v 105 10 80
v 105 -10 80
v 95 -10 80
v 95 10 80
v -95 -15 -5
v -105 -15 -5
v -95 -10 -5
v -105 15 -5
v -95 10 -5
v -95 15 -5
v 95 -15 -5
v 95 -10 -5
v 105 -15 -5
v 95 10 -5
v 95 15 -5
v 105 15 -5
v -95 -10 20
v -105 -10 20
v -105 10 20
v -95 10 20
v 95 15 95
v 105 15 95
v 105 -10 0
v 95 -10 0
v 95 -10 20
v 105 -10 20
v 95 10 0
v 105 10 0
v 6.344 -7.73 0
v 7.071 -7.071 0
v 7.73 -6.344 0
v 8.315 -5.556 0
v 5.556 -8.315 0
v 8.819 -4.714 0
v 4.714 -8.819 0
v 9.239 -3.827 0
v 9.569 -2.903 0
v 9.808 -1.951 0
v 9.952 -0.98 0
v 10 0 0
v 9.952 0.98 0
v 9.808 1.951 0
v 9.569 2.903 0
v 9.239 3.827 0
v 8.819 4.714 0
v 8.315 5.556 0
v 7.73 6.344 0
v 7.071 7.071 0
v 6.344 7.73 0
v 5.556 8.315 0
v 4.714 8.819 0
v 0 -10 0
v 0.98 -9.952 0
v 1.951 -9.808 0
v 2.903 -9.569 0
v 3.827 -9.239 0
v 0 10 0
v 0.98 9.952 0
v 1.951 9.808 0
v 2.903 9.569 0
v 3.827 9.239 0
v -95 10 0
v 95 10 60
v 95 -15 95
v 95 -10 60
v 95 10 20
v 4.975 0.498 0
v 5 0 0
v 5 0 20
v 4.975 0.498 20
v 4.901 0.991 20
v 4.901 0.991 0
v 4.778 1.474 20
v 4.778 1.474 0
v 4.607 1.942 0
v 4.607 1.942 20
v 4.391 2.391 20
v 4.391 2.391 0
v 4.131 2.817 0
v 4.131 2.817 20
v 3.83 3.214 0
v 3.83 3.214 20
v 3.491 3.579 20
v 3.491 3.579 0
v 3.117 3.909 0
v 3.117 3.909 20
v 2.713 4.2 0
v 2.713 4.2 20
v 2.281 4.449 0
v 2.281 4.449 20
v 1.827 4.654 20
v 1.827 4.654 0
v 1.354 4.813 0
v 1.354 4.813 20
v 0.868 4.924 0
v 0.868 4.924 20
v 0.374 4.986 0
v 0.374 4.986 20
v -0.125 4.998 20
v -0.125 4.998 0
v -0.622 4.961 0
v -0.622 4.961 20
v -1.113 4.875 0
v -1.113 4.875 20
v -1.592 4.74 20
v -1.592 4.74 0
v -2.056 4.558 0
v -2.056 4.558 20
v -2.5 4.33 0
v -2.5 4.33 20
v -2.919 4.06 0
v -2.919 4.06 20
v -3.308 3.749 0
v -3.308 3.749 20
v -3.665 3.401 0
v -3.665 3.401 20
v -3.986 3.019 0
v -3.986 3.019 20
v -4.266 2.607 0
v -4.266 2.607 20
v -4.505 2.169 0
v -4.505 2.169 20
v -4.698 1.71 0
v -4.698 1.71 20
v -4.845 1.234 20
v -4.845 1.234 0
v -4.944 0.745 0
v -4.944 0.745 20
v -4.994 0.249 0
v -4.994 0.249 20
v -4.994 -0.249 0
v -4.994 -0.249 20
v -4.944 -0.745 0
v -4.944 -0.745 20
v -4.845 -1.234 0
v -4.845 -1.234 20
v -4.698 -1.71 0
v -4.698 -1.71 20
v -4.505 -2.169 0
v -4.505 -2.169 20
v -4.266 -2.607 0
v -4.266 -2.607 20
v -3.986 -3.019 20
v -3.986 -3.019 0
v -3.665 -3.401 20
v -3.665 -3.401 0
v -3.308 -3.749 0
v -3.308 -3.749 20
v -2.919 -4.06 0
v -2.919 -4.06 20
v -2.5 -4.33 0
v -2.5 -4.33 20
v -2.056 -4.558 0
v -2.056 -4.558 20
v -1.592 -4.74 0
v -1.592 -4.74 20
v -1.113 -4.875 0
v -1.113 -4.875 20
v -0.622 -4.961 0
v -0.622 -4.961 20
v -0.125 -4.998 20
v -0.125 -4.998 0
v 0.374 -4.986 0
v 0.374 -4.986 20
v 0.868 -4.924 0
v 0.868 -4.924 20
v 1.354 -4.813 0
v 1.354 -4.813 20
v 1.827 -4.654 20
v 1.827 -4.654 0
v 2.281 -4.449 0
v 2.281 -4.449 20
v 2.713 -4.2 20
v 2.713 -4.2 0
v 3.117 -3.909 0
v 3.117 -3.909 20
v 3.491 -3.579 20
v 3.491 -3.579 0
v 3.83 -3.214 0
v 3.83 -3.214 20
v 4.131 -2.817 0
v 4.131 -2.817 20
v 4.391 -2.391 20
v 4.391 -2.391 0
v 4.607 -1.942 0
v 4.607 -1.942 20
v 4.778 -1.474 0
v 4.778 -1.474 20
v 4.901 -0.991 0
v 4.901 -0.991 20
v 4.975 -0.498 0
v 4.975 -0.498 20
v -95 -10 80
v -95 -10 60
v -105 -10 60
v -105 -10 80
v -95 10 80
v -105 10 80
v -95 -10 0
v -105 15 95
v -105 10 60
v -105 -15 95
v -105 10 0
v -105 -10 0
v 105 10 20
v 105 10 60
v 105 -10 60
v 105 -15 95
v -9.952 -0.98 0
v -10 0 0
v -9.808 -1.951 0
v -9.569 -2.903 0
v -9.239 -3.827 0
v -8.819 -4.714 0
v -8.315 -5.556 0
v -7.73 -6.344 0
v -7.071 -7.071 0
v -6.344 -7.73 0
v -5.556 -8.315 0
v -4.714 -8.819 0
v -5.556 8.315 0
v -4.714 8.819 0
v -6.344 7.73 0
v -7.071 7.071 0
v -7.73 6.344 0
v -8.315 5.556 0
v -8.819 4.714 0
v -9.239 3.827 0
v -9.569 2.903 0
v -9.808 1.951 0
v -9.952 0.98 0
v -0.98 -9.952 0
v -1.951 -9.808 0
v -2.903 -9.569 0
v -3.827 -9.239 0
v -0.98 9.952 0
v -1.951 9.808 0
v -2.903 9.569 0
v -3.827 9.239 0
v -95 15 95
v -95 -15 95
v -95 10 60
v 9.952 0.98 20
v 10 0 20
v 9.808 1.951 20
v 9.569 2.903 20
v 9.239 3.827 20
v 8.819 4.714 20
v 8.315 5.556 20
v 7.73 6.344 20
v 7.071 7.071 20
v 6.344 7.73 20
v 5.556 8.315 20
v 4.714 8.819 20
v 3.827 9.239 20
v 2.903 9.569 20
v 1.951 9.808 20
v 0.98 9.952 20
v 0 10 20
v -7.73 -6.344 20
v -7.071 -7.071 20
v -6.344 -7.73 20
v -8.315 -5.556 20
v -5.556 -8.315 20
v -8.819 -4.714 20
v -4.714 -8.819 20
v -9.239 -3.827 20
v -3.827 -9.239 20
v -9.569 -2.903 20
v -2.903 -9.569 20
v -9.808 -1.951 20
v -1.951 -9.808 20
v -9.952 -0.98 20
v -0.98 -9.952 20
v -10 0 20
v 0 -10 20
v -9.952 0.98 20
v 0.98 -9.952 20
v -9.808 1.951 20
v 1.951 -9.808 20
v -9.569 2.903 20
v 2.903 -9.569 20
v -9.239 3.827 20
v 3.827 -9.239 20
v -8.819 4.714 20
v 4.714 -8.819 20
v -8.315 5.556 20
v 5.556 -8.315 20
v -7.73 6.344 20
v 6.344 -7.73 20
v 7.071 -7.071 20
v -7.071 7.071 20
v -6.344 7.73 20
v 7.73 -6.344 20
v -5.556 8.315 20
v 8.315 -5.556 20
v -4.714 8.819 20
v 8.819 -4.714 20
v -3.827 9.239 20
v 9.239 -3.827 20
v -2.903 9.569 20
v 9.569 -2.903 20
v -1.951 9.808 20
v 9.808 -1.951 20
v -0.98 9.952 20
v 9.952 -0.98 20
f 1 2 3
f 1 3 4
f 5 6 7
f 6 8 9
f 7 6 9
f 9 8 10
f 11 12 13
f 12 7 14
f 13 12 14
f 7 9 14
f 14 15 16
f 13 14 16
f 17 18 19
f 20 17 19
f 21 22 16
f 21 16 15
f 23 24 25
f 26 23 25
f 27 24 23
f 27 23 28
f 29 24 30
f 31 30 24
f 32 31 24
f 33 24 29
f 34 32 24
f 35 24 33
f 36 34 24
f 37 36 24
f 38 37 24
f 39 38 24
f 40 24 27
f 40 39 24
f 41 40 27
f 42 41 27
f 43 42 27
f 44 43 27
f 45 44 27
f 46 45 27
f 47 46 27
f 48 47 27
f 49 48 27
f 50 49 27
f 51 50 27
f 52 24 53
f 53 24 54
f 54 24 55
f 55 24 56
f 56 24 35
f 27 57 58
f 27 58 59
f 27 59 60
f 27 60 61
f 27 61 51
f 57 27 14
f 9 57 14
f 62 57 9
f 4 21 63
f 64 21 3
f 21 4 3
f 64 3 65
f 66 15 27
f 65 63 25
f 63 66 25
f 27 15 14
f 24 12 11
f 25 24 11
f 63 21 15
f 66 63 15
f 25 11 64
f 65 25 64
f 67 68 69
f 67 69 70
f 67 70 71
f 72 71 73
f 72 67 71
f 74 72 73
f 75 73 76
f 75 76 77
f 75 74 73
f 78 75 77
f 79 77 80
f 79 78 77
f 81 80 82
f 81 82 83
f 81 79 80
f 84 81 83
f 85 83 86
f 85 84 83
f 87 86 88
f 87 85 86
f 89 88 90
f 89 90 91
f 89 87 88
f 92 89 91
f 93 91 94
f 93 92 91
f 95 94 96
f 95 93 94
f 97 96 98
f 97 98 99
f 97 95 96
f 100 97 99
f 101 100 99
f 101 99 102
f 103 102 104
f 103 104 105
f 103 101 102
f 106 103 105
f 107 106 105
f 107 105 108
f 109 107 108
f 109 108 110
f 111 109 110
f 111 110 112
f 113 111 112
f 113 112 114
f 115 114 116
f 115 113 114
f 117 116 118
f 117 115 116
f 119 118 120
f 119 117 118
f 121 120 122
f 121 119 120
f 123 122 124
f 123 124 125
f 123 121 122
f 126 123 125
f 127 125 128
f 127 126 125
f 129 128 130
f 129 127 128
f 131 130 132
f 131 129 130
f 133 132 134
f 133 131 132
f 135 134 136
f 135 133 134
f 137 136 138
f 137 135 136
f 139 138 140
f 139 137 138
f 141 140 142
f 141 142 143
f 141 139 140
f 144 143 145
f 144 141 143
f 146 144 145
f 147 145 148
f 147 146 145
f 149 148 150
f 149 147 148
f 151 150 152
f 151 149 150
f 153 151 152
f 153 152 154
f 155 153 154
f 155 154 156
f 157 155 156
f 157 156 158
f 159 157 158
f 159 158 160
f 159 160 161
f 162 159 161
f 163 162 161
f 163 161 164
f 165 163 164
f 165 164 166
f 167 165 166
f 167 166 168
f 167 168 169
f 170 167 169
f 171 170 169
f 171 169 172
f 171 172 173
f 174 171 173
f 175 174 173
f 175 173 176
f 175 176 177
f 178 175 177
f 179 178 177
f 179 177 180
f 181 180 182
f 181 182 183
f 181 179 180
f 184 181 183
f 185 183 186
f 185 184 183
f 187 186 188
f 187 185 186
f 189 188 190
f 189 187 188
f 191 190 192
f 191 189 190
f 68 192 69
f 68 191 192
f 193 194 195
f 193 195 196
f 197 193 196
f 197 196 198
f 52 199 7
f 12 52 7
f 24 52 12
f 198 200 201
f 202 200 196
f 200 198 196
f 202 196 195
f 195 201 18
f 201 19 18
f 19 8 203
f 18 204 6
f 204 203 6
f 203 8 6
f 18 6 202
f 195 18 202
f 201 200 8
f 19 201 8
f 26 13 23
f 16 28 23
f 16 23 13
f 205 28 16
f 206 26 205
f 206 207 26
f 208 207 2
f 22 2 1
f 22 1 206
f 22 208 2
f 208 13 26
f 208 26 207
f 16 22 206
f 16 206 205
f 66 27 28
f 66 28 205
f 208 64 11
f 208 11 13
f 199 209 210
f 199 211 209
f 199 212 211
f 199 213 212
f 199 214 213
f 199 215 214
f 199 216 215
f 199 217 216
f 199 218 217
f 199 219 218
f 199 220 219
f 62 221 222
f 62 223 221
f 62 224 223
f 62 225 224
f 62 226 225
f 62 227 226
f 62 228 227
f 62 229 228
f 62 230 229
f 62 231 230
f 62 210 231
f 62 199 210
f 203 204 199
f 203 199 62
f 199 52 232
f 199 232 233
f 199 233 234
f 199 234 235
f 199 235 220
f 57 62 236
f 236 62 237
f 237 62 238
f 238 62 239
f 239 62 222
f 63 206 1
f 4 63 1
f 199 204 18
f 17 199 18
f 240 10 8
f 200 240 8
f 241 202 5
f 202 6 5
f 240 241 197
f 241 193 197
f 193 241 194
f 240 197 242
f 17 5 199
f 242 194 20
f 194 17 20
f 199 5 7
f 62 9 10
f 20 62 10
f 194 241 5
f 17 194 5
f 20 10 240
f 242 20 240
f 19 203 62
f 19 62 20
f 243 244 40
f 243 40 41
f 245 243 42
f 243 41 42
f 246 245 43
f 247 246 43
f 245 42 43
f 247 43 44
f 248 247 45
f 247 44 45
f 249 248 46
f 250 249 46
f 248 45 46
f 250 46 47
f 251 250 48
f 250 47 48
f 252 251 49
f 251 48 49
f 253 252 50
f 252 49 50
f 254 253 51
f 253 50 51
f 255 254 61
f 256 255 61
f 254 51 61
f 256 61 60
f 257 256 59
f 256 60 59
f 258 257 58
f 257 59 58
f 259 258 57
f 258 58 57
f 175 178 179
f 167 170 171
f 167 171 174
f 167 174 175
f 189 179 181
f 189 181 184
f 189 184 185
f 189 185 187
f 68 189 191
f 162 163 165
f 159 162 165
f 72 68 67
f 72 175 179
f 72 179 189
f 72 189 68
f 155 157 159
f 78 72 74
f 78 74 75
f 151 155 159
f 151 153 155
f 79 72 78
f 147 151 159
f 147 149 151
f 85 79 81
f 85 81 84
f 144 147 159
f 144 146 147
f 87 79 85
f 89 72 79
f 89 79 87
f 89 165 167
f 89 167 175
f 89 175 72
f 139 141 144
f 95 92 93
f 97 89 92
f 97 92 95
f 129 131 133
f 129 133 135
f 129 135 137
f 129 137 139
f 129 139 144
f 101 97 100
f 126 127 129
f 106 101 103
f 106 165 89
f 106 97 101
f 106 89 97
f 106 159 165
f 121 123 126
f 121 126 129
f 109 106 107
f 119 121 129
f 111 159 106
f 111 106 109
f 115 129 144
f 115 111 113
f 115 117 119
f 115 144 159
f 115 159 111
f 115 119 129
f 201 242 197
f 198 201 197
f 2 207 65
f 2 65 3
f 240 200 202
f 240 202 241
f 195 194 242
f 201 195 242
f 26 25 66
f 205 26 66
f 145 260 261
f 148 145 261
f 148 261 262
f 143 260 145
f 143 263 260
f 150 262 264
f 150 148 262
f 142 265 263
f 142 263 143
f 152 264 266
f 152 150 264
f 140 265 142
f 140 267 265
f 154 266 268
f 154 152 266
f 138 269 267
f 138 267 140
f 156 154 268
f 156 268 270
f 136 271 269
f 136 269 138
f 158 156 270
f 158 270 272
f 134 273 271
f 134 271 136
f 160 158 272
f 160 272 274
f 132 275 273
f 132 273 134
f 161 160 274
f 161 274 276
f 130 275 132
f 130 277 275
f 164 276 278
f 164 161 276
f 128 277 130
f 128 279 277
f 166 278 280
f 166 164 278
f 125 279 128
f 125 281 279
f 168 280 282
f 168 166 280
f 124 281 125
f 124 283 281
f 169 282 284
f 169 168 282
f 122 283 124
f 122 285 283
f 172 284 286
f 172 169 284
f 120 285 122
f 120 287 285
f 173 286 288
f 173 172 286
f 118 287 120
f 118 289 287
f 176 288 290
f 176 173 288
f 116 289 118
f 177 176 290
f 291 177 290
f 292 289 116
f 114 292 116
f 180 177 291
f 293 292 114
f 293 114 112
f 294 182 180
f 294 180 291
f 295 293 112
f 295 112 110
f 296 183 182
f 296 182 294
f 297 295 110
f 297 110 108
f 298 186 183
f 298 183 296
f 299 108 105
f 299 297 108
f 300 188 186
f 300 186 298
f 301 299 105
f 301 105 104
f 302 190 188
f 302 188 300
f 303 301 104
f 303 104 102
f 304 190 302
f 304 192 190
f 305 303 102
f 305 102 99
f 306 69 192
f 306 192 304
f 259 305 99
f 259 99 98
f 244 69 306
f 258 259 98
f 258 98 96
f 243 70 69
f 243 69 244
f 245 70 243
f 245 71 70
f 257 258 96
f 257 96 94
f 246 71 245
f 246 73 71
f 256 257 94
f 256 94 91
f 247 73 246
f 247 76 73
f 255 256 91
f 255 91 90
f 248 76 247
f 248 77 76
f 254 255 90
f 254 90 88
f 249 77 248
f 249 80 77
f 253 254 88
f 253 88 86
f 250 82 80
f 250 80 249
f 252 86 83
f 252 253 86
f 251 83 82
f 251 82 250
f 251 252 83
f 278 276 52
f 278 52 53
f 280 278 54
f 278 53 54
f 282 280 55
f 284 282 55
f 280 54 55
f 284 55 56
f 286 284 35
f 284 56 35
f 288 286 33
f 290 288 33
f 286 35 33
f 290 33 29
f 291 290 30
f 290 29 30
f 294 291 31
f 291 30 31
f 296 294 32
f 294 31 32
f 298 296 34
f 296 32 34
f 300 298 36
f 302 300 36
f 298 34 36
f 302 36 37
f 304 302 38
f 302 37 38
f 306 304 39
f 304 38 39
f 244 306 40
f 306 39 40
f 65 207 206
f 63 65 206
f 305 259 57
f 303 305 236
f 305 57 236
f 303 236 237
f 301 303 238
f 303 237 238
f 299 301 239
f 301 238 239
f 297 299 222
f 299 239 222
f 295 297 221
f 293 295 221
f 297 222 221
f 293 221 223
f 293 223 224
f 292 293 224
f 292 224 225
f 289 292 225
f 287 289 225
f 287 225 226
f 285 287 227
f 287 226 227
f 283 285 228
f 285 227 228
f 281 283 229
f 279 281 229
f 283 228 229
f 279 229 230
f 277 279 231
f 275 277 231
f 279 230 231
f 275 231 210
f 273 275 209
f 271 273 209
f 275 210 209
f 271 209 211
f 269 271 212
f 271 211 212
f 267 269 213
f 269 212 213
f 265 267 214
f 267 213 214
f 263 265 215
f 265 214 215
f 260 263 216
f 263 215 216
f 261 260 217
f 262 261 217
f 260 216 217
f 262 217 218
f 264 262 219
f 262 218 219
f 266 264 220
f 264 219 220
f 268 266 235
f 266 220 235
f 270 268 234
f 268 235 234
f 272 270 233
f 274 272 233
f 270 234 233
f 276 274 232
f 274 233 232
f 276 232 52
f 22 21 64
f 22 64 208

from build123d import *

# Parameters (mm, degrees)
F0_R     = 5
F2_DEPTH = 5
F3_DEPTH = 95
F1_W     = 20
F1_H     = 20
F4_DEPTH = 200
F5_DEPTH = 20


with BuildPart() as f2:
    # F0 (on Top) → F2 (new body)
    with BuildSketch(Plane.XY):
        Polygon((-95, -10), (-95, 10), (-95, 15), (-105, 15), (-105, -15), (-95, -15), align=None)
        with BuildLine():
            ThreePointArc((0, -10), (-10, 0), (0, 10))
            Line((0, 10), (-95, 10))
            Line((-95, 10), (-95, -10))
            Line((-95, -10), (0, -10))
        make_face()
        with BuildLine():
            ThreePointArc((0, 10), (7.071068, 7.071068), (10, 0))
            ThreePointArc((10, 0), (7.071068, -7.071068), (0, -10))
            Line((0, -10), (95, -10))
            Line((95, -10), (95, 10))
            Line((95, 10), (0, 10))
        make_face()
        Polygon((95, 15), (95, 10), (95, -10), (95, -15), (105, -15), (105, 15), align=None)
        with BuildLine():
            ThreePointArc((0, -10), (7.071068, -7.071068), (10, 0))
            ThreePointArc((10, 0), (7.071068, 7.071068), (0, 10))
            ThreePointArc((0, 10), (-10, 0), (0, -10))
        make_face()
        Circle(F0_R, mode=Mode.SUBTRACT)
        Circle(F0_R)
    extrude(amount=-F2_DEPTH)

    # F0 (on Top) → F3 (join)
    with BuildSketch(Plane.XY):
        Polygon((-95, -10), (-95, 10), (-95, 15), (-105, 15), (-105, -15), (-95, -15), align=None)
        Polygon((95, 15), (95, 10), (95, -10), (95, -15), (105, -15), (105, 15), align=None)
    extrude(amount=F3_DEPTH)

    # F1 (on Right) → F4 (cut, symmetric)
    with BuildSketch(Plane.YZ):
        with Locations((0, 10)):
            Rectangle(F1_W, F1_H)
        with Locations((0, 70)):
            Rectangle(F1_W, F1_H)
    extrude(amount=F4_DEPTH, both=True, mode=Mode.SUBTRACT)

    # F0 (on Top) → F5 (join)
    with BuildSketch(Plane.XY):
        with BuildLine():
            ThreePointArc((0, -10), (7.071068, -7.071068), (10, 0))
            ThreePointArc((10, 0), (7.071068, 7.071068), (0, 10))
            ThreePointArc((0, 10), (-10, 0), (0, -10))
        make_face()
        Circle(F0_R, mode=Mode.SUBTRACT)
    extrude(amount=F5_DEPTH)


solid = f2.part
